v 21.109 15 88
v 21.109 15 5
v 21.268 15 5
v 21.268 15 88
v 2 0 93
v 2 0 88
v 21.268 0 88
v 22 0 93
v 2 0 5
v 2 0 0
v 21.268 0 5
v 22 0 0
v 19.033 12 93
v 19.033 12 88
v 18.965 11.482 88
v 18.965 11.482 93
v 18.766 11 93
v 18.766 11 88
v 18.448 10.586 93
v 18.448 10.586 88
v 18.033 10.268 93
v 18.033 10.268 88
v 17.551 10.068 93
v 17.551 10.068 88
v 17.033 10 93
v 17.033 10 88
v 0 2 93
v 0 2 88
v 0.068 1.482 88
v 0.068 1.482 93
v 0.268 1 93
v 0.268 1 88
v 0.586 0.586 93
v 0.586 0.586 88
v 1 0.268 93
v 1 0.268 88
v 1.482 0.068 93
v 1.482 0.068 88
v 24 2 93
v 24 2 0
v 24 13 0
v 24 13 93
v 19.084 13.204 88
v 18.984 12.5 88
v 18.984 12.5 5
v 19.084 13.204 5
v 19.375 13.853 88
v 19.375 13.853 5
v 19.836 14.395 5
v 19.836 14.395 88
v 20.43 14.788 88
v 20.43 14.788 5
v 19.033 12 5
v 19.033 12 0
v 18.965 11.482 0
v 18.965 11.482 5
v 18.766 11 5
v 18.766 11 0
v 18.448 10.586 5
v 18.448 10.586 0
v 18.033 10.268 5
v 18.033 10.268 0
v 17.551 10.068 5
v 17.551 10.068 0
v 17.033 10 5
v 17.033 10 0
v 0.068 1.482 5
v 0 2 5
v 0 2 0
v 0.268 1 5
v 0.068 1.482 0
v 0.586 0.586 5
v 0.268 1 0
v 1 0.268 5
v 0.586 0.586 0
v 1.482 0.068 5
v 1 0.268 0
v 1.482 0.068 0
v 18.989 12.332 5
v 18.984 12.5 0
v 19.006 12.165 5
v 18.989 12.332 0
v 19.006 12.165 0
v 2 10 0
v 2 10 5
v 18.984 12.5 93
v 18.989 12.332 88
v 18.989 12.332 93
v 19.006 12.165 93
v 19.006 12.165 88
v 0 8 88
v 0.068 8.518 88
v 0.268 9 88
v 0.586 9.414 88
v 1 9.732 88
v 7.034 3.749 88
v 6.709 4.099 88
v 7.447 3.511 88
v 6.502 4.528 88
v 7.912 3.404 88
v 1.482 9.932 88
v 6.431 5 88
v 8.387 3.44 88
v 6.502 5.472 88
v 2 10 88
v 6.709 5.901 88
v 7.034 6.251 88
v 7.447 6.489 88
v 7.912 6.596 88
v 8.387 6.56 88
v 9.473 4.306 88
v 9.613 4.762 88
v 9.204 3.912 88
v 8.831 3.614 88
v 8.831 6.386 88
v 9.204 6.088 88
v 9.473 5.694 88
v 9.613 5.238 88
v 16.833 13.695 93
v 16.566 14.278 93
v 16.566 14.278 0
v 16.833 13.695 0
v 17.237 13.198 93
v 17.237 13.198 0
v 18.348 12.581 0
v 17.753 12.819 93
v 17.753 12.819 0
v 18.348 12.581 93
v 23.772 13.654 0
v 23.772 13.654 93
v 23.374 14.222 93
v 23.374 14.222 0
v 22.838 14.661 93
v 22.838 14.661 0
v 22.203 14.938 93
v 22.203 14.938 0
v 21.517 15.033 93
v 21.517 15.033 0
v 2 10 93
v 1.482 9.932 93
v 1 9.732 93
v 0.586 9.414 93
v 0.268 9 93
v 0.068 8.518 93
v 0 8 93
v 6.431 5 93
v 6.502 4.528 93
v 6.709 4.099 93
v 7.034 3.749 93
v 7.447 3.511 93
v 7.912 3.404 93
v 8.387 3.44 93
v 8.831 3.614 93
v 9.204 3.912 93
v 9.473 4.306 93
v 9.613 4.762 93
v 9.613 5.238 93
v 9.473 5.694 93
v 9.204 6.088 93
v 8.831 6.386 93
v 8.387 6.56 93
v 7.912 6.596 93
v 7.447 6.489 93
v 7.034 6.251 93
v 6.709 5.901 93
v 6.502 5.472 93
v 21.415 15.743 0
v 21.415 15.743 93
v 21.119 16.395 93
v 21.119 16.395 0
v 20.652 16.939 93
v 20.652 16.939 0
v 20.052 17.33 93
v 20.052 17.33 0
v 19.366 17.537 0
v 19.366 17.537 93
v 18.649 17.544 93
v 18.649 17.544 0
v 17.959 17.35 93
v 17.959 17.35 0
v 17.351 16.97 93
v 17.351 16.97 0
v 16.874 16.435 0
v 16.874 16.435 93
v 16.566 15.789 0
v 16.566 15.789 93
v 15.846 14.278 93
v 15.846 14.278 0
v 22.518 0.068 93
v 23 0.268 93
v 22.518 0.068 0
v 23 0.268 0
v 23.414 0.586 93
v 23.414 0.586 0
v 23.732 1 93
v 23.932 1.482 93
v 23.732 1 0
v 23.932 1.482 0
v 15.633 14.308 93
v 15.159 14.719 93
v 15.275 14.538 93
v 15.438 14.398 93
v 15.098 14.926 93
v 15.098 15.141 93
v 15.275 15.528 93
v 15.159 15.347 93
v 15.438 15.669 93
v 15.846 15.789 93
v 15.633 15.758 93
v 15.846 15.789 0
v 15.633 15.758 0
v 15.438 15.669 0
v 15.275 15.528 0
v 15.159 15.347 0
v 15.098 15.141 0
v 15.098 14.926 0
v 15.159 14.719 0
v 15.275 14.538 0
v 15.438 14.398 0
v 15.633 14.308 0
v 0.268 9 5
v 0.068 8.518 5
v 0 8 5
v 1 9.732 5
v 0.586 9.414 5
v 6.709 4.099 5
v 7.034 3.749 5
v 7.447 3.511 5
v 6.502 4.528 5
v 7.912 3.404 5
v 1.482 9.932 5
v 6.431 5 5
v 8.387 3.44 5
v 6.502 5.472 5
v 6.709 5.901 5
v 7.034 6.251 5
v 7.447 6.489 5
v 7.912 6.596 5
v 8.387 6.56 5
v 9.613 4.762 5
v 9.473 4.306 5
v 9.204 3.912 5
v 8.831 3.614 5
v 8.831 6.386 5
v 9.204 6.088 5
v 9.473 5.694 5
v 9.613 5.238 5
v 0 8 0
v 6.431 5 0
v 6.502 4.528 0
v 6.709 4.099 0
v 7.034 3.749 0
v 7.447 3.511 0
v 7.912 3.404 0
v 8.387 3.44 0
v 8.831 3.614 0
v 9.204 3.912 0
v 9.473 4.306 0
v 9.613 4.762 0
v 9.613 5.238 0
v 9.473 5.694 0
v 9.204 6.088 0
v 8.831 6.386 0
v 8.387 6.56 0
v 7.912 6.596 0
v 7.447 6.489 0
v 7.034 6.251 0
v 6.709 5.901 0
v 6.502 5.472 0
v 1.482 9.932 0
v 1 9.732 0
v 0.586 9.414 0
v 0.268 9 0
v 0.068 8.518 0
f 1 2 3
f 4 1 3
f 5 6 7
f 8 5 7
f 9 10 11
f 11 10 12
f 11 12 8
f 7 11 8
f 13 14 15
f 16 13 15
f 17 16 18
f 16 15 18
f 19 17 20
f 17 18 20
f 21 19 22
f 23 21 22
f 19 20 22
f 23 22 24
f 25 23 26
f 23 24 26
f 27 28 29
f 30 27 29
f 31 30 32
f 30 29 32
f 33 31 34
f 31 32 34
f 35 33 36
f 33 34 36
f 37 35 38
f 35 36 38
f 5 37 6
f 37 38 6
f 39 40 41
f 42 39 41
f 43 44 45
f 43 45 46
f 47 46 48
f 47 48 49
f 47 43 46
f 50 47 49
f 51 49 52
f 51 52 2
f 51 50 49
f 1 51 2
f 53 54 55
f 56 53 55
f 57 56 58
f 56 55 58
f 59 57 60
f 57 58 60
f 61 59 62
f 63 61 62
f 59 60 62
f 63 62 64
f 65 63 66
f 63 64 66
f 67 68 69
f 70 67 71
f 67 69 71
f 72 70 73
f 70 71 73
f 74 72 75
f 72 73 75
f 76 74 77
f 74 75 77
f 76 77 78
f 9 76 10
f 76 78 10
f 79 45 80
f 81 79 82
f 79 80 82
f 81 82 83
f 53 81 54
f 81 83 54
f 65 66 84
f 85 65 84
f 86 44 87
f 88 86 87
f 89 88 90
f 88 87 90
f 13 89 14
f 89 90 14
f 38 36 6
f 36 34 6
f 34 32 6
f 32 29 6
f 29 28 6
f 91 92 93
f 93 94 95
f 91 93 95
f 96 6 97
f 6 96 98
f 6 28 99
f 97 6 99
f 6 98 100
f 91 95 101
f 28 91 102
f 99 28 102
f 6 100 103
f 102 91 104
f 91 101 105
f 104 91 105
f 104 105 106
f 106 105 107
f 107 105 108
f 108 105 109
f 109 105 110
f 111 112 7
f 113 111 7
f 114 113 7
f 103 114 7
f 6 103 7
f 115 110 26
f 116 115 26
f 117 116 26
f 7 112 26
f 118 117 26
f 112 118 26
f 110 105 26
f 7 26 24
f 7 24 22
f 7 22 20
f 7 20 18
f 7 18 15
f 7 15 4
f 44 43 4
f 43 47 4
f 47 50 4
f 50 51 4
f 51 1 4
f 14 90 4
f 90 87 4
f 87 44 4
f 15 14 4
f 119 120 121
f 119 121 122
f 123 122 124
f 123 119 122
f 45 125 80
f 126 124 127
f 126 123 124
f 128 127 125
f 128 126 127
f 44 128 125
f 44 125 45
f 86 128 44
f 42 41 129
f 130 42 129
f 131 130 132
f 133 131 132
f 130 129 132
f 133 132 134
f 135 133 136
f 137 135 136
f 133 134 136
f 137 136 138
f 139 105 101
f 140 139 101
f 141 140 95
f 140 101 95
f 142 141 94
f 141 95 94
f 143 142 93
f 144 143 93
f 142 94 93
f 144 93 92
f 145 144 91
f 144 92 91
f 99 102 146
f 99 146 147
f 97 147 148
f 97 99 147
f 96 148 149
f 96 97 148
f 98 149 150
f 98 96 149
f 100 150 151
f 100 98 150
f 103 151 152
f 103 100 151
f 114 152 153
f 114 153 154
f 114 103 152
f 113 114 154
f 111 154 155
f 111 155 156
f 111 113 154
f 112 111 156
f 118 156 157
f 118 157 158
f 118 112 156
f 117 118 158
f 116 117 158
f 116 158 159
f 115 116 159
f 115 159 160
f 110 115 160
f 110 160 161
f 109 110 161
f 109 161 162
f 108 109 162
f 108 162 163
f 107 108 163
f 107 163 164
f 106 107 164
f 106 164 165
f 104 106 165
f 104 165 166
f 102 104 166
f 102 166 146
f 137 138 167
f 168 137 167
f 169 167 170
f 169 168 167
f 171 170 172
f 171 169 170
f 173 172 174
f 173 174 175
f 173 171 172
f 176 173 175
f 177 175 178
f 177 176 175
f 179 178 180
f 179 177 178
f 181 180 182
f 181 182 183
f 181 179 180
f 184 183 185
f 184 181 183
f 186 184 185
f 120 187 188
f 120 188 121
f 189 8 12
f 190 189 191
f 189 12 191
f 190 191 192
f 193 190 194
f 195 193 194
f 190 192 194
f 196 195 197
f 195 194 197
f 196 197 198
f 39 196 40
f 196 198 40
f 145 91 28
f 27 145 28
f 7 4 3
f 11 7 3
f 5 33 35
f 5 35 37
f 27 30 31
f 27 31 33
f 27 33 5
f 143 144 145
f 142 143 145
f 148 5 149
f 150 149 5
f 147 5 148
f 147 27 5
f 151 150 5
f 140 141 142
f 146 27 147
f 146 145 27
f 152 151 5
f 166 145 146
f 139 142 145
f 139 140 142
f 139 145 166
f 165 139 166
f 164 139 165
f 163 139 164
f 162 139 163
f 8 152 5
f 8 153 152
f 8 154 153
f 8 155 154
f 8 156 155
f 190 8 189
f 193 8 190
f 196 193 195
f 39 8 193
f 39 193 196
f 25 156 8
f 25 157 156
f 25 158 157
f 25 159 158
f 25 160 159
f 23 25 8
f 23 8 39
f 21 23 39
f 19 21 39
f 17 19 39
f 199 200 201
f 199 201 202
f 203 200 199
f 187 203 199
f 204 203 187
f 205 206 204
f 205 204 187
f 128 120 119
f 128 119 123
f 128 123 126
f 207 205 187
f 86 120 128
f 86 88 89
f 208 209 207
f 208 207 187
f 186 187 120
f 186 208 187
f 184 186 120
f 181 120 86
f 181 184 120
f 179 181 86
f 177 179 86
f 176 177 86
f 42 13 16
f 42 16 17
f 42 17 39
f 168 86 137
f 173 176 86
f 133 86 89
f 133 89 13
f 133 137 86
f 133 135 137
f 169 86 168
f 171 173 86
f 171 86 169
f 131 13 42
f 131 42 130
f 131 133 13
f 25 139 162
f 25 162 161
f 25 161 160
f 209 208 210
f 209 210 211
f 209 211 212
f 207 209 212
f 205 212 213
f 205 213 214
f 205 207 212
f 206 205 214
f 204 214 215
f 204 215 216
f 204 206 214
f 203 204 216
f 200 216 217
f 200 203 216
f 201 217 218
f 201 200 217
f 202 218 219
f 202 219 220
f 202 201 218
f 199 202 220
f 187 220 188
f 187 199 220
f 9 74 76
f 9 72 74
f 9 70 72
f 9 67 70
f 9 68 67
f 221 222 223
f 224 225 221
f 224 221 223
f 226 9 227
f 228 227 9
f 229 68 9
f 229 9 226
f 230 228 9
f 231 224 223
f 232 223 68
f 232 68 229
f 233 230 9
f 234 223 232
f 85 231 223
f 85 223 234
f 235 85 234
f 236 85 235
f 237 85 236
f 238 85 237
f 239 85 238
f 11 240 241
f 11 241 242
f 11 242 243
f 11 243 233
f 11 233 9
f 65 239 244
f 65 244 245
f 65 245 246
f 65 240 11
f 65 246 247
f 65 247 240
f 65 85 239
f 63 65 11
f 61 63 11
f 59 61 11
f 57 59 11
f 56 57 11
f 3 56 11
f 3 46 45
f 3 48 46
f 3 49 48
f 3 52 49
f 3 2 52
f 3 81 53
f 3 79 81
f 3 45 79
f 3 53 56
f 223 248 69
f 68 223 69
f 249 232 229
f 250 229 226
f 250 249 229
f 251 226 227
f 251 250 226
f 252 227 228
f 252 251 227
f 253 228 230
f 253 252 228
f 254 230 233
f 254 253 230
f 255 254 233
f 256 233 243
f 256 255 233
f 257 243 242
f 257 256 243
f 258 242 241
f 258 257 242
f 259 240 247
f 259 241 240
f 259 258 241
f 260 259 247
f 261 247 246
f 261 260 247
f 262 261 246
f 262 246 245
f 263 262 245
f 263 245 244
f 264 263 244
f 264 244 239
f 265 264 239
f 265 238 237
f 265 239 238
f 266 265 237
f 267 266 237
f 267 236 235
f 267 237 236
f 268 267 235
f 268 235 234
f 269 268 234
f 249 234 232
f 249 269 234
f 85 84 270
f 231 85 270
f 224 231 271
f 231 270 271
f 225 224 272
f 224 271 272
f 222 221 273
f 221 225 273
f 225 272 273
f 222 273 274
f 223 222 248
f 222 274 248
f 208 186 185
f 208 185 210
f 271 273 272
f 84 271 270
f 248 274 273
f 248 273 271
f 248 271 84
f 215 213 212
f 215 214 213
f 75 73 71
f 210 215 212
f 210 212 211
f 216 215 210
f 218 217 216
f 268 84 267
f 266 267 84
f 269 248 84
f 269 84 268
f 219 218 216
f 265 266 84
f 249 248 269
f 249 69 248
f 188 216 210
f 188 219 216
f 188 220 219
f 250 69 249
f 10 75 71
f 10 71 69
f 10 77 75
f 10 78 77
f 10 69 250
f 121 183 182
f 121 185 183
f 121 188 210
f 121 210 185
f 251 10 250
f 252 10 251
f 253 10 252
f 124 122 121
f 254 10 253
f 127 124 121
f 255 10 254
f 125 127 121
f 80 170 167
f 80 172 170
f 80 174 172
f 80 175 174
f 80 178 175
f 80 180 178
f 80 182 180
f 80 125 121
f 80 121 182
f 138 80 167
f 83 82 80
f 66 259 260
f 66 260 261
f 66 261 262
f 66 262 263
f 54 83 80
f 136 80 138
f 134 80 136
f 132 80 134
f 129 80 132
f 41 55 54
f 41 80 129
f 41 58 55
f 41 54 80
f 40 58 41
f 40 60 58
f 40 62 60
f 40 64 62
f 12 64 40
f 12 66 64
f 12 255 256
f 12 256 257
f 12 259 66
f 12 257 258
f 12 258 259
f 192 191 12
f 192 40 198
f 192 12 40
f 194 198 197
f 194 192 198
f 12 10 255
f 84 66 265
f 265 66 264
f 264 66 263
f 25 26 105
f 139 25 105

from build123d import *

# Parameters (mm, degrees)
SKETCH1_R           = 1.6
BOSS_EXTRUDE1_DEPTH = 93
SKETCH3_W           = 21.267787972
SKETCH3_H           = 83
CUT_EXTRUDE2_DEPTH  = 90
BOSS_EXTRUDE4_REACH = 99.216


with BuildPart() as part:
    # Sketch1 → Boss-Extrude1 (new body)
    with BuildSketch(Plane.XY):
        with BuildLine():
            Line((17.033489737, 10), (2, 10))
            ThreePointArc((2, 10), (0.585786438, 9.414213562), (0, 8))
            Line((0, 8), (0, 2))
            ThreePointArc((0, 2), (0.585786438, 0.585786438), (2, 0))
            Line((2, 0), (20.255670014, 0))
            Line((20.255670014, 0), (22, 0))
            ThreePointArc((22, 0), (23.414213562, 0.585786438), (24, 2))
            Line((24, 2), (24, 10))
            Line((24, 10), (24, 13))
            ThreePointArc((24, 13), (21.016744869, 14.983255131), (19.033489737, 12))
            ThreePointArc((19.033489737, 12), (18.447703299, 10.585786438), (17.033489737, 10))
        make_face()
        with Locations(Location((8.031280577, 5, 0), (0, 0, 180))):
            Circle(SKETCH1_R, mode=Mode.SUBTRACT)
    extrude(amount=BOSS_EXTRUDE1_DEPTH)

    # Sketch3 → Cut-Extrude2 (cut)
    with BuildSketch(Plane(origin=(0, 15, 0), x_dir=(1, 0, 0), z_dir=(0, 1, 0))):
        with Locations((10.633893986, -46.5)):
            Rectangle(SKETCH3_W, SKETCH3_H)
    extrude(amount=-CUT_EXTRUDE2_DEPTH, mode=Mode.SUBTRACT)

    # Boss-Extrude4: up to this face of the body (flat: up to its plane)
    boss_extrude4_end = Plane(part.part.faces().sort_by_distance((13.034633822, 5.682959989, 0))[0])
    # Sketch4 → Boss-Extrude4 (add, up to the picked face)
    with BuildSketch(Plane.XY.offset(93), mode=Mode.PRIVATE) as boss_extrude4_sk1:
        with BuildLine():
            ThreePointArc((21.516744869, 15.033092191), (19.36575731, 17.537199237), (16.565837736, 15.78855692))
            Line((16.565837736, 15.78855692), (15.846137498, 15.78855692))
            ThreePointArc((15.846137498, 15.78855692), (15.090672769, 15.033092191), (15.846137498, 14.277627462))
            Line((15.846137498, 14.277627462), (16.565837736, 14.277627462))
            ThreePointArc((16.565837736, 14.277627462), (17.483170381, 12.992232341), (18.983652678, 12.5))
            ThreePointArc((18.983652678, 12.5), (19.725578203, 14.291166666), (21.516744869, 15.033092191))
        make_face()
    boss_extrude4_tool1 = split(extrude(boss_extrude4_sk1.sketch, amount=-BOSS_EXTRUDE4_REACH, mode=Mode.PRIVATE), bisect_by=boss_extrude4_end, keep=Keep.BOTH, mode=Mode.PRIVATE)
    add(boss_extrude4_tool1.solids().sort_by(Axis((18.413371, 15.285709, 93), (0, 0, -1)))[0])


solid = part.part
